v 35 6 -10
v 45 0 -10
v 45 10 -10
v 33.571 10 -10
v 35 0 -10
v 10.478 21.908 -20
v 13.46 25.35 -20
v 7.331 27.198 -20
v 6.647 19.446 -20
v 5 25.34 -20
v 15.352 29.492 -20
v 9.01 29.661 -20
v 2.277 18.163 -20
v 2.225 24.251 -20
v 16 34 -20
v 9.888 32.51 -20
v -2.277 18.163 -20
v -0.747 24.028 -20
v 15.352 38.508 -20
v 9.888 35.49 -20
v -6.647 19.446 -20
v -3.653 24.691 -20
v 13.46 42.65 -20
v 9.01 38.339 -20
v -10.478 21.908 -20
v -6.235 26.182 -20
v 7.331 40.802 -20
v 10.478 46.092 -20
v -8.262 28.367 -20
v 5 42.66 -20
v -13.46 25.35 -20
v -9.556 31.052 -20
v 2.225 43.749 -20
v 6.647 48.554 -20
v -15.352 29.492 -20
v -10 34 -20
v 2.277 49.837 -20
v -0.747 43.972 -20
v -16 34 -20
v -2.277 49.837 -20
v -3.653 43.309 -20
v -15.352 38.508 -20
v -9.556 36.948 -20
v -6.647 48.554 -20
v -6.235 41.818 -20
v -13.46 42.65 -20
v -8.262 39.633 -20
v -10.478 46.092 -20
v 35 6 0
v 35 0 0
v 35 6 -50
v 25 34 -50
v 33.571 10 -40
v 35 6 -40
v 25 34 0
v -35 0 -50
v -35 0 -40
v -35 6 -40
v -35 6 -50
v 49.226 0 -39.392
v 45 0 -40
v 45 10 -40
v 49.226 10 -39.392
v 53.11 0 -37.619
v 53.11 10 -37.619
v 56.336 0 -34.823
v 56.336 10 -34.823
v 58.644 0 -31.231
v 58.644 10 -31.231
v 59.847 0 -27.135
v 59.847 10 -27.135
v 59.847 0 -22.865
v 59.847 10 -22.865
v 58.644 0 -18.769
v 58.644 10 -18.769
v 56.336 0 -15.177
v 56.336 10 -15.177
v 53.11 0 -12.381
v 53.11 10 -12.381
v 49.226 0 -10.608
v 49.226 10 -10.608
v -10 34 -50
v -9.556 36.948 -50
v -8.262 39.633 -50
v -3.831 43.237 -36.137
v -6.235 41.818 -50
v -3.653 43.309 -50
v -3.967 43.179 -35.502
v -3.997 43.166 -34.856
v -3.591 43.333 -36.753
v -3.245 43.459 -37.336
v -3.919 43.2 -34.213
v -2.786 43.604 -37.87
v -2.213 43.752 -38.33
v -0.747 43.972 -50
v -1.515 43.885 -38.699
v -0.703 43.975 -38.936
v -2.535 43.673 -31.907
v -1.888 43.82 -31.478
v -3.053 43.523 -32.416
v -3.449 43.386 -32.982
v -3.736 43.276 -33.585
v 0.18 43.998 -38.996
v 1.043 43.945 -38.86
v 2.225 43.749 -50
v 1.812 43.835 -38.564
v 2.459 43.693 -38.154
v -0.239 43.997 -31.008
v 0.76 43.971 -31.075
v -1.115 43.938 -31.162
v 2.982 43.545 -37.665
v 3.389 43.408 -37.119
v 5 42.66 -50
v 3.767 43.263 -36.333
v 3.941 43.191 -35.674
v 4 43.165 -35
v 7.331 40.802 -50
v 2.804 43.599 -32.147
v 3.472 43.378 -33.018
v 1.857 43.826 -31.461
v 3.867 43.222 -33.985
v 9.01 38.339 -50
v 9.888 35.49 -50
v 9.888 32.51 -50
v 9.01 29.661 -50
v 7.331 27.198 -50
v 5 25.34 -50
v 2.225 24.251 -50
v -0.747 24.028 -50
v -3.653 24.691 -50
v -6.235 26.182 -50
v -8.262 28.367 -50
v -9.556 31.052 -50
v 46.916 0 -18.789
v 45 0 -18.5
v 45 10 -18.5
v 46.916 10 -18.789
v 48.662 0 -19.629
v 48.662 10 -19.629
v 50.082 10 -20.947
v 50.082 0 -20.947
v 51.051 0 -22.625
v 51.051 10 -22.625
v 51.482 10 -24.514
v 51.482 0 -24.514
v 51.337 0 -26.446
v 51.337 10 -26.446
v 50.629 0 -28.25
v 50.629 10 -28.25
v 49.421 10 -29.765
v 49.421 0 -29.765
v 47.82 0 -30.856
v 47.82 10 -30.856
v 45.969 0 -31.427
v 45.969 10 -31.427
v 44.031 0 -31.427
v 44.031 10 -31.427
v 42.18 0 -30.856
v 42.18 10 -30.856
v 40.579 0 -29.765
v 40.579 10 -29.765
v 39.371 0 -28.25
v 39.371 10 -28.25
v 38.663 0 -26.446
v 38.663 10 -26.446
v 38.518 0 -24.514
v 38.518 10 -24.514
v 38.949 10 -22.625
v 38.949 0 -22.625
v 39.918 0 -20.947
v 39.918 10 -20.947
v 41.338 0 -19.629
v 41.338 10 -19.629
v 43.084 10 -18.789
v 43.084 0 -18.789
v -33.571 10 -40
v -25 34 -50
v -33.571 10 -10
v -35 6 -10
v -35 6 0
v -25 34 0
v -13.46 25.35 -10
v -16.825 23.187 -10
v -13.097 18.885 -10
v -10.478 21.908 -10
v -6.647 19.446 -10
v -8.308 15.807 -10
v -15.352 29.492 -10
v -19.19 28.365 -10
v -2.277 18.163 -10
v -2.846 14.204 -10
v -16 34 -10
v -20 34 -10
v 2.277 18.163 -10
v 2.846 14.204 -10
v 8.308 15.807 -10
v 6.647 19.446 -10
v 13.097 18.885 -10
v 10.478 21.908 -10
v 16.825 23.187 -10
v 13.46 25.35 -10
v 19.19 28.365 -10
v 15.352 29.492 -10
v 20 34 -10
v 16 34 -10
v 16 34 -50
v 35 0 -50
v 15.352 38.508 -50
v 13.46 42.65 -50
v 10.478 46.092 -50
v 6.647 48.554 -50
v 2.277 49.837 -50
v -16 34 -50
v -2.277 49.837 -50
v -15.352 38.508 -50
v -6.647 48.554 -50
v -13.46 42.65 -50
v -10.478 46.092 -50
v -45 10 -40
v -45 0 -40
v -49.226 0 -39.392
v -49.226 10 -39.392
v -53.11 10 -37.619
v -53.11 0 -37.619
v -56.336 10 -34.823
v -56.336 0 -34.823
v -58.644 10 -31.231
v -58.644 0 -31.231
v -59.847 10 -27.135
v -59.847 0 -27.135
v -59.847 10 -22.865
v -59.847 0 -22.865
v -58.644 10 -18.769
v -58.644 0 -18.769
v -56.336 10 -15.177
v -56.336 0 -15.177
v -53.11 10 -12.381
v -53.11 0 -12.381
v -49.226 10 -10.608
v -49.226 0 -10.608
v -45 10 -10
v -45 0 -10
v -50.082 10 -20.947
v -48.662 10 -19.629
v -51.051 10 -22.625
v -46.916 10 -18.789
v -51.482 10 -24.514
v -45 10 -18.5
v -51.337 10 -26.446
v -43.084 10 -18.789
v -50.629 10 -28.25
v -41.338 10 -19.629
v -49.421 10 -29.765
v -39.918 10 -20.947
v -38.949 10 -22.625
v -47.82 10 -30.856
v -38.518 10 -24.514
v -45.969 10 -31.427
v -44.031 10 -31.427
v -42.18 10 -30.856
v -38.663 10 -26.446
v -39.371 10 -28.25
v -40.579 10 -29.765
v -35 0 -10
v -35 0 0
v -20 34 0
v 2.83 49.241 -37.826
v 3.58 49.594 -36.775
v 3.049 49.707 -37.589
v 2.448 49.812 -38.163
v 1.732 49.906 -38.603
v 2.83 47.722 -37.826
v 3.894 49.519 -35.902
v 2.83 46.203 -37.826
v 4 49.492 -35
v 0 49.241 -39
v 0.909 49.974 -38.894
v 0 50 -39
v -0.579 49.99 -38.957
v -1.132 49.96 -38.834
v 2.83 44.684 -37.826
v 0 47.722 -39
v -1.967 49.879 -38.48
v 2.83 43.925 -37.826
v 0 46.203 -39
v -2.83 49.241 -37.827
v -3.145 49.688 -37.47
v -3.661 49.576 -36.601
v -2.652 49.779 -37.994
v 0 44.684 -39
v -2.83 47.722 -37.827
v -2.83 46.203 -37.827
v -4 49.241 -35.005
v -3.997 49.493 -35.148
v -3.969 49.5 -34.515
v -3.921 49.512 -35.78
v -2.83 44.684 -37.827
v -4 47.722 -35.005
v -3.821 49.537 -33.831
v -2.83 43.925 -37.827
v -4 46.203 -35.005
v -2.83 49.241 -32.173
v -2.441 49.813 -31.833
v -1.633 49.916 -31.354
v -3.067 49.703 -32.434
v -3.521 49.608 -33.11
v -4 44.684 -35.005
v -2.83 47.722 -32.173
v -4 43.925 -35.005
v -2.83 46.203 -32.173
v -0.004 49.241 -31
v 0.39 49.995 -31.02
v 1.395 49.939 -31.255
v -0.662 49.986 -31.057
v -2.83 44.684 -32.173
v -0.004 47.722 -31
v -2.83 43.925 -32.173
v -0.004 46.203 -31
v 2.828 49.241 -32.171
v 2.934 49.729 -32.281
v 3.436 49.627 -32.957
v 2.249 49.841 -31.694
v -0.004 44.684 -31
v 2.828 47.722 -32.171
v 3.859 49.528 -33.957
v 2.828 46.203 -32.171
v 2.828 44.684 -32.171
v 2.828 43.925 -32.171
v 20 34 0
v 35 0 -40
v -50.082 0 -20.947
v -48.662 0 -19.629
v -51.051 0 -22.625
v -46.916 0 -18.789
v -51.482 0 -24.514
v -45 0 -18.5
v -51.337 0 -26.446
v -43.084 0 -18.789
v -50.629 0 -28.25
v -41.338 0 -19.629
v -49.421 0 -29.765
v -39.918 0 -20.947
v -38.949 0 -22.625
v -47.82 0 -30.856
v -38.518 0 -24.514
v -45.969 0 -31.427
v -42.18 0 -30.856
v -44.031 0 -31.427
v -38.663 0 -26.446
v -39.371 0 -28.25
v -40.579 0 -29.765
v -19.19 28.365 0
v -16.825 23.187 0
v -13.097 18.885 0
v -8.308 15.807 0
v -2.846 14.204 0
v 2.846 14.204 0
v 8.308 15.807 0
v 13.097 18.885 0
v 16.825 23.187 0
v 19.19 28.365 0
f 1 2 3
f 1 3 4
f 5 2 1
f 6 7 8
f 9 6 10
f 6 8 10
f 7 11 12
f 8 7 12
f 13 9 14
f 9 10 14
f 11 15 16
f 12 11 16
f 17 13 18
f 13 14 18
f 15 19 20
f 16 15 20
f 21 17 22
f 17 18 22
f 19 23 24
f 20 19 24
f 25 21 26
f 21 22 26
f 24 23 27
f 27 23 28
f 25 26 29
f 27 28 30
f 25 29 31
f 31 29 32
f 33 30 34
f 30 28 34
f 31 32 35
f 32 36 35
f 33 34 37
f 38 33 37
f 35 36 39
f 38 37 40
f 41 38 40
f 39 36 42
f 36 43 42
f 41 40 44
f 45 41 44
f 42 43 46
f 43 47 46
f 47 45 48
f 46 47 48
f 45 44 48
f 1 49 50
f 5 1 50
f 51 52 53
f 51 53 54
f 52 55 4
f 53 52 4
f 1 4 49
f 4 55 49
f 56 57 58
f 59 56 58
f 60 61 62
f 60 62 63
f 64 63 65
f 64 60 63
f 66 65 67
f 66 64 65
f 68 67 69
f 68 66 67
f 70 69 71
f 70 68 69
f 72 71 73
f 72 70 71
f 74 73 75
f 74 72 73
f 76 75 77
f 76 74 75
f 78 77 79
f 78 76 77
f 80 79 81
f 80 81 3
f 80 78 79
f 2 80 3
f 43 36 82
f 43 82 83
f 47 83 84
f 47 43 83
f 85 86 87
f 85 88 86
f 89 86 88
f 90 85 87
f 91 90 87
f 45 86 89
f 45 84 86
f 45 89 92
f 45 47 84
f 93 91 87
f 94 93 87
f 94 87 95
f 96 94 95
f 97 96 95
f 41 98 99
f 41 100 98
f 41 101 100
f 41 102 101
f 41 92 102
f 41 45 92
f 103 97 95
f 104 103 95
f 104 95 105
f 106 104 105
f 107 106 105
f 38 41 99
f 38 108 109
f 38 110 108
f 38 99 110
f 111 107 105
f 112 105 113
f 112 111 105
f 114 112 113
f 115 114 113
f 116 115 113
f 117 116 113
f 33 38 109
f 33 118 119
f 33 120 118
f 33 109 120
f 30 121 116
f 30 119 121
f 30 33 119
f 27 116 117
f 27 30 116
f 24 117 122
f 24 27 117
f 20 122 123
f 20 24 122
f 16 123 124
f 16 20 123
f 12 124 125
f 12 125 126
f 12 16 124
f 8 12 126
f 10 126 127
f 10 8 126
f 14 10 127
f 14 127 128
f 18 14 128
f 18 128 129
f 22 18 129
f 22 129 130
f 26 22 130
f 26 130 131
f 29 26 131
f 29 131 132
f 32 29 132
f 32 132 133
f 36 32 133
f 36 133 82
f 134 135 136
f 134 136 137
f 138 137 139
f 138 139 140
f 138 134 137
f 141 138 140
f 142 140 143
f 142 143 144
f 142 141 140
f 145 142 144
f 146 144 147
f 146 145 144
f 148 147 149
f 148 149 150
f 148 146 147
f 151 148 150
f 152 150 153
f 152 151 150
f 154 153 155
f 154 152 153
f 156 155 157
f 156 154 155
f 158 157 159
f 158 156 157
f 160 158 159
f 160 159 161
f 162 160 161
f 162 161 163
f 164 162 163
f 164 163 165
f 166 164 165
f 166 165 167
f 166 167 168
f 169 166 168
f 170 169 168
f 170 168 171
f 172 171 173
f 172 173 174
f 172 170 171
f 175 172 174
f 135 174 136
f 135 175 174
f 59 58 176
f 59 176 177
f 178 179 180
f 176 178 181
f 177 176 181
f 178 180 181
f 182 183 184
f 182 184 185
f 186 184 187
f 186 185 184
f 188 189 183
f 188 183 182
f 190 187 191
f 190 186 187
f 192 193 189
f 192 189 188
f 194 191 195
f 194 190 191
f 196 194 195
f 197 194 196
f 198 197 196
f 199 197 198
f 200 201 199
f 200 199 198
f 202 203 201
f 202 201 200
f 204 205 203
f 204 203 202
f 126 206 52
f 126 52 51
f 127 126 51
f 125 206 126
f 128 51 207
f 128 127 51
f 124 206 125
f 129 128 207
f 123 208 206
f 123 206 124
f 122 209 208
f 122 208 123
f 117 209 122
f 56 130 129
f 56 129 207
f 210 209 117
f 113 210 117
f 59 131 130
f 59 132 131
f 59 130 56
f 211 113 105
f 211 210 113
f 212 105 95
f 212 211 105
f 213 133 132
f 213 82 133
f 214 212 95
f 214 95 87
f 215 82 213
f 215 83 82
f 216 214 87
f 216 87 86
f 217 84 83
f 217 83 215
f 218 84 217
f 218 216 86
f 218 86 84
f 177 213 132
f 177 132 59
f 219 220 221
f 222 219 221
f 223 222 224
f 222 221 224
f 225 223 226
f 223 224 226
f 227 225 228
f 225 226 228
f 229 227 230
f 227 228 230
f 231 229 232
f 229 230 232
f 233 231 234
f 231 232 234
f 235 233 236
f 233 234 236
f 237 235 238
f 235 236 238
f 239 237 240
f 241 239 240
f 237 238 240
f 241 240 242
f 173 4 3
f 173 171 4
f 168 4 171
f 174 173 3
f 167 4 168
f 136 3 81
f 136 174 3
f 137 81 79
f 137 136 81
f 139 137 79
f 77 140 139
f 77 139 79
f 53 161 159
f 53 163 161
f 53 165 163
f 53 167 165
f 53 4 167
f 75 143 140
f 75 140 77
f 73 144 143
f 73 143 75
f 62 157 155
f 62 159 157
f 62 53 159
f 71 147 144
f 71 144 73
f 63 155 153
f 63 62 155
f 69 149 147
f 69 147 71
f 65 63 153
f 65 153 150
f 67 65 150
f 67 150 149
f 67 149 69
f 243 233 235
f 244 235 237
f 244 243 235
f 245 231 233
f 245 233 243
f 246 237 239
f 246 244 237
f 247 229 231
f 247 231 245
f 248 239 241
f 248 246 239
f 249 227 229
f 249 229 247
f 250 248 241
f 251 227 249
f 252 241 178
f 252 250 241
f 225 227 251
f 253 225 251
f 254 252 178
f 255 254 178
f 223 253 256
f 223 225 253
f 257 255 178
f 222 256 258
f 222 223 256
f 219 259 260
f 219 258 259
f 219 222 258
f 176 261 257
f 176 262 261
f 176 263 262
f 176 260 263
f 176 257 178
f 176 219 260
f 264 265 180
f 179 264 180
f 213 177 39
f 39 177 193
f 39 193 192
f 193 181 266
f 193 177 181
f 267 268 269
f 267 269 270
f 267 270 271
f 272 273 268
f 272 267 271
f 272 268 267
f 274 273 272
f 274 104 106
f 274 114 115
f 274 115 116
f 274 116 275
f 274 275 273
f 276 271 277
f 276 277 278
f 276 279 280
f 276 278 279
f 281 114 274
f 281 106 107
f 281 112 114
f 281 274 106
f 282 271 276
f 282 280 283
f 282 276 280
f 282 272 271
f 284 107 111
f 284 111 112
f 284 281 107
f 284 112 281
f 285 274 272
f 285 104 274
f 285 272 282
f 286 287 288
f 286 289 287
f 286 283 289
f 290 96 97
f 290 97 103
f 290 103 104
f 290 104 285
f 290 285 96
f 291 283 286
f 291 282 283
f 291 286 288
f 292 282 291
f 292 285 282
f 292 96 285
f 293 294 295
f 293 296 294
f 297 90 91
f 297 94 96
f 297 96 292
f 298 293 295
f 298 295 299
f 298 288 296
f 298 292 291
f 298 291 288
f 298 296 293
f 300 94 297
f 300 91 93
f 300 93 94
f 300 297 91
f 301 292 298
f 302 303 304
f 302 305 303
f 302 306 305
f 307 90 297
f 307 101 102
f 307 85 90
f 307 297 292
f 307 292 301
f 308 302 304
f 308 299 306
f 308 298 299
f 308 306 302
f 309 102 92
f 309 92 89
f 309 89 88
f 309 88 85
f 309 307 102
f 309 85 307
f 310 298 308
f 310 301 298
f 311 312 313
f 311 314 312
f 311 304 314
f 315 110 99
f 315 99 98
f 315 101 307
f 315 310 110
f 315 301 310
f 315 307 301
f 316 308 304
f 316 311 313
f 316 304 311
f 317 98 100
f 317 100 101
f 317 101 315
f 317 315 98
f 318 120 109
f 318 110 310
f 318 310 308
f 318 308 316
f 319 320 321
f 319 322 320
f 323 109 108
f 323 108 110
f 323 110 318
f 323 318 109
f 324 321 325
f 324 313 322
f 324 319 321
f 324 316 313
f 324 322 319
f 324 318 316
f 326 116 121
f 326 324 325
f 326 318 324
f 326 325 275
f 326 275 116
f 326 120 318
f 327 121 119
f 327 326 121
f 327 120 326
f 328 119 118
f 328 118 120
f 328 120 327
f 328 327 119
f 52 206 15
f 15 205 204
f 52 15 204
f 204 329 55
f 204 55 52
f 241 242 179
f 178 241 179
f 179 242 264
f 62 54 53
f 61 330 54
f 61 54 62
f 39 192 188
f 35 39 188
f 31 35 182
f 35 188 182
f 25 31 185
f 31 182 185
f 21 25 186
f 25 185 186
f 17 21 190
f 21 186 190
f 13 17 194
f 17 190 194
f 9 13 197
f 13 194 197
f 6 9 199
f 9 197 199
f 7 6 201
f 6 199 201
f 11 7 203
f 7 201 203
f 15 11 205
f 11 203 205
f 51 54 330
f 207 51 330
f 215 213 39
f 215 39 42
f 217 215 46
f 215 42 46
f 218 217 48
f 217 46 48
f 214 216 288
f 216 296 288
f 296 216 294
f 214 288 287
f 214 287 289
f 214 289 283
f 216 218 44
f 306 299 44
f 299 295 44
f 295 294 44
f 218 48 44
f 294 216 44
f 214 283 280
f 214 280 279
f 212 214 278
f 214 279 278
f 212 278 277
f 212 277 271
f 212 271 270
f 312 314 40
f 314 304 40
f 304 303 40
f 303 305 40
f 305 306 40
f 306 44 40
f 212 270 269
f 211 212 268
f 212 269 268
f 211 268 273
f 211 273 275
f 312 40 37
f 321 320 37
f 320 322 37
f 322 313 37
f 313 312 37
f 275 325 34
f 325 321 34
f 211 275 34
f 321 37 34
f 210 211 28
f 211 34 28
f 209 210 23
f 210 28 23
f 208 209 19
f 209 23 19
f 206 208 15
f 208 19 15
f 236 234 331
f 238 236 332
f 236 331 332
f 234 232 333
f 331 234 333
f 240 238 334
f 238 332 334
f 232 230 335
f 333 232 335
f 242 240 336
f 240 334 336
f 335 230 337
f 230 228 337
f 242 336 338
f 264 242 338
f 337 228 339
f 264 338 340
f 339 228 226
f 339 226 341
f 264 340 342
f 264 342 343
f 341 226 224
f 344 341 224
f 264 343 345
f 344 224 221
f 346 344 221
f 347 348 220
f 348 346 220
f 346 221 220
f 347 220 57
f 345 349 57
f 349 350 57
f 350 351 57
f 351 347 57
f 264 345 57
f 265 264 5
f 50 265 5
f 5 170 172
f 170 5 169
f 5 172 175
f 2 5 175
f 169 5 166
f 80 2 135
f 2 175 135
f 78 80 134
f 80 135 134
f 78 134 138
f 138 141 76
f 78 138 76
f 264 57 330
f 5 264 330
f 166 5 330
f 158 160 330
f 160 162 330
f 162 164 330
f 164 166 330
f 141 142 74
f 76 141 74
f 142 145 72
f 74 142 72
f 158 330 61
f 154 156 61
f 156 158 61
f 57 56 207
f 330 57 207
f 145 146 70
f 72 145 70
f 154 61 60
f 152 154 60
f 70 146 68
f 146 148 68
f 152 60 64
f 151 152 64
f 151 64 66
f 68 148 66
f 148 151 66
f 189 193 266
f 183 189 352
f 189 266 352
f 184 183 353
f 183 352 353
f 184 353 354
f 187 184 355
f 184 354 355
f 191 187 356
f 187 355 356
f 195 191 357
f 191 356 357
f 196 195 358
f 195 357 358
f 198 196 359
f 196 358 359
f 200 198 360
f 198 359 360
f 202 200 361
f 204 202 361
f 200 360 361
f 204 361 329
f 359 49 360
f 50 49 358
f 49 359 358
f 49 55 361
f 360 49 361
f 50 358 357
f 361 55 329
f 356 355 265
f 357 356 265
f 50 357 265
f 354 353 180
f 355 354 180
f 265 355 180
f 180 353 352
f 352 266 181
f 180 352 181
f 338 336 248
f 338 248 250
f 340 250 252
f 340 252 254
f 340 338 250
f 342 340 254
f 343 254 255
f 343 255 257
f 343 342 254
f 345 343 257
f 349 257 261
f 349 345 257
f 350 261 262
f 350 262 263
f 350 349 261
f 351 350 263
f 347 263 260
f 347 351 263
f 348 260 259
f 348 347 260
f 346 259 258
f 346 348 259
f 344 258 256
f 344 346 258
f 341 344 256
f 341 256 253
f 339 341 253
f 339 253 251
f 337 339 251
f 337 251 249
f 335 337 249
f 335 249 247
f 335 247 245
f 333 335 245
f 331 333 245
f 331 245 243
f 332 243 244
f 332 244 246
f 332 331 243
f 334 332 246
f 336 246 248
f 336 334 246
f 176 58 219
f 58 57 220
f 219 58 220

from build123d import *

# Parameters (mm, degrees)
EXTRUDE_1_DEPTH     = 50
SKETCH_3_R          = 20
SKETCH_3_R_2        = 16
CUT_EXTRUDE_1_DEPTH = 10
CUT_EXTRUDE_2_DEPTH = 70.864153899
EXTRUDE_START       = -30
SKETCH_4_R          = 16
SKETCH_4_R_2        = 10
EXTRUDE_2_DEPTH     = 30
CUT_EXTRUDE_START   = 43.165151137
CUT_EXTRUDE_3_DEPTH = 6.834848863
SKETCH_6_R          = 6.5
EXTRUDE_3_DEPTH     = 10


# Read off the part's stored shape, not the designer's step: 切除-拉伸3
with BuildPart() as part:
    # 草图1 → 凸台-拉伸1 (new body)
    with BuildSketch(Plane.XY):
        Polygon((-35, 6), (-25, 34), (25, 34), (35, 6), (35, 0), (-35, 0), align=None)
    extrude(amount=-EXTRUDE_1_DEPTH)

    # 草图3 → 切除-拉伸1 (cut)
    with BuildSketch(Plane.XY):
        with Locations((0, 34)):
            Circle(SKETCH_3_R)
        with Locations((0, 34)):
            Circle(SKETCH_3_R_2, mode=Mode.SUBTRACT)
    extrude(amount=-CUT_EXTRUDE_1_DEPTH, mode=Mode.SUBTRACT)

    # 草图3<2> → 切除-拉伸2 (cut, through all)
    with BuildSketch(Plane.XY):
        with BuildLine():
            Line((-16, 34), (16, 34))
            ThreePointArc((16, 34), (0, 50), (-16, 34))
        make_face()
        with BuildLine():
            ThreePointArc((-16, 34), (0, 18), (16, 34))
            Line((16, 34), (-16, 34))
        make_face()
    extrude(amount=-CUT_EXTRUDE_2_DEPTH, mode=Mode.SUBTRACT)

    # 草图4 → 凸台-拉伸2 (add)
    with BuildSketch(Plane(origin=(0, 0, -50), x_dir=(-1, 0, 0), z_dir=(0, 0, -1)).offset(EXTRUDE_START)):
        with Locations((0, 34)):
            Circle(SKETCH_4_R)
        with Locations((0, 34)):
            Circle(SKETCH_4_R_2, mode=Mode.SUBTRACT)
    extrude(amount=EXTRUDE_2_DEPTH)

    # 切除-拉伸3 outline → 切除-拉伸3 (cut)
    with BuildSketch(Plane(origin=(0, 0, 0), x_dir=(1, 0, 0), z_dir=(0, 1, 0)).offset(CUT_EXTRUDE_START)):
        with BuildLine():
            add(Edge.make_bspline(
                [(3.99999996, 35), (3.999967414, 36.053927104), (3.563514164, 37.092301246), (2.830425635, 37.826427201), (2.096738851, 38.561151707), (1.06888327, 39), (-1.068884266, 39), (-2.100127628, 38.557285469), (-2.829510993, 37.827342841), (-3.558894179, 37.09740029), (-3.998804852, 36.060507963), (-4.001190045, 33.948526829), (-3.561222969, 32.904953883), (-2.829556469, 32.172702671), (-2.097890055, 31.440451664), (-1.056916053, 31.001093572), (1.048622532, 30.998910725), (2.090006878, 31.433217451), (2.82830312, 32.171448876), (3.566599135, 32.909680204), (3.999318272, 33.942605173), (3.999999722, 34.998278644), (3.999999987, 34.999139327), (3.99999996, 35)],
                knots=[0.750101996, 0.750101996, 0.750101996, 0.750101996, 0.875, 0.875, 0.875000116, 1, 1, 1.124999999, 1.124999999, 1.125000021, 1.249999998, 1.249999998, 1.374999984, 1.374999984, 1.375000009, 1.499999969, 1.499999969, 1.624999954, 1.624999954, 1.624999981, 1.749999938, 1.749999938, 1.750101934, 1.750101934, 1.750101934, 1.750101934], degree=3))
        make_face()
    extrude(amount=CUT_EXTRUDE_3_DEPTH, mode=Mode.SUBTRACT)

    # 草图6 → 凸台-拉伸3 (add)
    # profile 1 of 2: a face of its own
    with BuildSketch(Plane(origin=(0, 0, 0), x_dir=(1, 0, 0), z_dir=(0, 1, 0))):
        with BuildLine():
            Line((-35, 40), (-45, 40))
            ThreePointArc((-45, 40), (-60, 25), (-45, 10))
            Line((-45, 10), (-35, 10))
            Line((-35, 10), (35, 10))
            Line((35, 10), (35, 40))
            Line((35, 40), (-35, 40))
        make_face()
        with Locations(Location((-45, 25, 0), (0, 0, 270))):
            Circle(SKETCH_6_R, mode=Mode.SUBTRACT)
    # profile 2 of 2: a face of its own
    with BuildSketch(Plane(origin=(0, 0, 0), x_dir=(1, 0, 0), z_dir=(0, 1, 0))):
        with BuildLine():
            ThreePointArc((45, 40), (60, 25), (45, 10))
            Line((45, 10), (35, 10))
            Line((35, 10), (35, 40))
            Line((35, 40), (45, 40))
        make_face()
        with Locations(Location((45, 25, 0), (0, 0, 270))):
            Circle(SKETCH_6_R, mode=Mode.SUBTRACT)
    extrude(amount=EXTRUDE_3_DEPTH)


solid = part.part
